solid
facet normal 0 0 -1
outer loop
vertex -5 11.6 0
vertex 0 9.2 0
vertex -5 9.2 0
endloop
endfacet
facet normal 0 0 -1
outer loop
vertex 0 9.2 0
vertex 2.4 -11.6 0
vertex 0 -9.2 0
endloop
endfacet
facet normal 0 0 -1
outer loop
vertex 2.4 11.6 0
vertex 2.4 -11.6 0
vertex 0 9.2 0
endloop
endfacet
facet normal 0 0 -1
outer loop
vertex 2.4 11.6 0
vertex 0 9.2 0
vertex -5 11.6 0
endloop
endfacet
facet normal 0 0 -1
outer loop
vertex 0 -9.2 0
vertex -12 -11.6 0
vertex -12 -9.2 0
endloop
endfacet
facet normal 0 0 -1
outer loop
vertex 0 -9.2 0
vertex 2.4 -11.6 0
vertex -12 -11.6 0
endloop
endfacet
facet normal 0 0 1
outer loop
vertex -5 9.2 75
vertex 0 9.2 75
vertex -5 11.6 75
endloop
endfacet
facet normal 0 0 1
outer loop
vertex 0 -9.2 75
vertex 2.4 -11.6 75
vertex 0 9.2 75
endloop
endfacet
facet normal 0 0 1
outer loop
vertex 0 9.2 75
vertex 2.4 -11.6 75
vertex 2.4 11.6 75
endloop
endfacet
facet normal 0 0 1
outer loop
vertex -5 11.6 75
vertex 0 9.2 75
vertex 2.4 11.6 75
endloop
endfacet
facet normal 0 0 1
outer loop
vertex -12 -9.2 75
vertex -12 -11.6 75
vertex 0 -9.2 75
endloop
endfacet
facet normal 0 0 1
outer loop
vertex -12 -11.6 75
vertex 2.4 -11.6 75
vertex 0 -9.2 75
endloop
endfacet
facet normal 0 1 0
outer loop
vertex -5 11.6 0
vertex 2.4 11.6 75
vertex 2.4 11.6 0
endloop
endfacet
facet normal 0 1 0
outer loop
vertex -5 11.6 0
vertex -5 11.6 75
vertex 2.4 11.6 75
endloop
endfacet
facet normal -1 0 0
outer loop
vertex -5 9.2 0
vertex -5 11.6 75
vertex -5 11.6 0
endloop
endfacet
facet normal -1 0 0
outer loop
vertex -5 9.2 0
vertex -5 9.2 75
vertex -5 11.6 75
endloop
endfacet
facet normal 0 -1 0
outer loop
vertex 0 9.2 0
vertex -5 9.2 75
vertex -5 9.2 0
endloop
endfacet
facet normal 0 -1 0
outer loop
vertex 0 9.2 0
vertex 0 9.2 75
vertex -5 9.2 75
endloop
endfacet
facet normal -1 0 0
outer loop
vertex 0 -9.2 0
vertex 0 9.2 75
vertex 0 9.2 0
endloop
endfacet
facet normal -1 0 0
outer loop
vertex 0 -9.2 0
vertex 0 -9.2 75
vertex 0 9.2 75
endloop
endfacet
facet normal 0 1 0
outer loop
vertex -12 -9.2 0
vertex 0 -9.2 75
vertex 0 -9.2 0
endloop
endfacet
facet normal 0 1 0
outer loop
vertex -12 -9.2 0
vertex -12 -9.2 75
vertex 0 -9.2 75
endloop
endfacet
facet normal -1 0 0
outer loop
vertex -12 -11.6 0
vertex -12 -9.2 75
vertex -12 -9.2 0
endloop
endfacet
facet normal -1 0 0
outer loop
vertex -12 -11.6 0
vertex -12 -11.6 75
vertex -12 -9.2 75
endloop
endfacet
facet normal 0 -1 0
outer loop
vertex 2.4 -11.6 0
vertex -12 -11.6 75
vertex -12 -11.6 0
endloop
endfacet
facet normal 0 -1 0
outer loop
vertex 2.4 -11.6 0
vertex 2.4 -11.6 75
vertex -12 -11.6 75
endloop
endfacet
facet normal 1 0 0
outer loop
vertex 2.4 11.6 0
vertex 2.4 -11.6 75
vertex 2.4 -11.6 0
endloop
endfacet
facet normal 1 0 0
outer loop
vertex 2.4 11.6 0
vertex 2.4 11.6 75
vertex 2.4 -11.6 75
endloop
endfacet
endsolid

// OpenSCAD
// weir — shelf-edge label holder (clip-on, no adhesive)
// Hooks over the front edge of an open melamine shelf; the front plate carries a
// Brother P-touch label (pasted on). Parametric: tune the vars, F5 preview / F6
// render, export STL. PLA-friendly defaults — this is a fit-test v1.
//
// Part of the physical-library tooling arc (see ROADMAP.md → Glass): the printed
// clip + a Brother label, holding a class-section marker that matches the call
// numbers (e.g. "36 · Earth sciences"). Pairs with tools/shelf-list.mjs.
//
// PRINT ORIENTATION: lay it FRONT-FACE-DOWN on the bed (the flat label face on the
// glass = smoothest surface for the tape; the two grip arms then point straight UP,
// so there are no overhangs and you need no supports).
//
// TUNING: if it's too tight/loose on the shelf after the first print, change
// `fit_tolerance` only and reprint — that's the one dimension PLA shrinkage affects.

/* ---------- parameters ---------- */
shelf_thickness = 18;    // melamine board thickness at the front edge (mm)
fit_tolerance   = 0.4;   // slide-on clearance; bump to ~0.6 if the first print is tight
wall            = 2.4;   // structural wall thickness (3 perimeters @ 0.4 nozzle ≈ 1.2; 2.4 is sturdy)
top_lip         = 5;     // how far the UPPER arm reaches onto the shelf top — keep small;
                         //   front-align your spines just behind this little rail
bottom_lip      = 12;    // how far the LOWER arm tucks under the board (longer = hangs steadier)
holder_width    = 75;    // length along the shelf edge (also the max label width)

label_recess    = 0;     // 0 = flat front face (just paste the Brother label on it).
                         //   set e.g. 0.6 for a shallow pocket that registers the tape straight
label_w         = 68;    // recess width  (only used if label_recess > 0)
label_h         = 12;    // recess height (Brother 12 mm tape; use 18 for 18 mm tape)

$fn = 32;

/* ---------- derived ---------- */
gap   = shelf_thickness + fit_tolerance;   // vertical cavity the board slides into
// 2D C-clip cross-section in (X = depth, Y = height); plate at front (X 0..wall),
// arms reach back (negative X) over/under the board.
module profile() {
  polygon([
    [-top_lip,     gap/2        ],   // upper arm — inner, back
    [-top_lip,     gap/2 + wall ],   // upper arm — outer, back
    [ wall,        gap/2 + wall ],   // front plate — top outer
    [ wall,       -gap/2 - wall ],   // front plate — bottom outer
    [-bottom_lip, -gap/2 - wall ],   // lower arm — outer, back
    [-bottom_lip, -gap/2        ],   // lower arm — inner, back
    [ 0,          -gap/2        ],   // cavity — inner bottom front
    [ 0,           gap/2        ],   // cavity — inner top front
  ]);
}

difference() {
  linear_extrude(height = holder_width) profile();   // extrude along the shelf edge
  if (label_recess > 0)                               // optional label-registration pocket
    translate([wall - label_recess, -label_h/2, (holder_width - label_w)/2])
      cube([label_recess + 1, label_h, label_w]);
}
